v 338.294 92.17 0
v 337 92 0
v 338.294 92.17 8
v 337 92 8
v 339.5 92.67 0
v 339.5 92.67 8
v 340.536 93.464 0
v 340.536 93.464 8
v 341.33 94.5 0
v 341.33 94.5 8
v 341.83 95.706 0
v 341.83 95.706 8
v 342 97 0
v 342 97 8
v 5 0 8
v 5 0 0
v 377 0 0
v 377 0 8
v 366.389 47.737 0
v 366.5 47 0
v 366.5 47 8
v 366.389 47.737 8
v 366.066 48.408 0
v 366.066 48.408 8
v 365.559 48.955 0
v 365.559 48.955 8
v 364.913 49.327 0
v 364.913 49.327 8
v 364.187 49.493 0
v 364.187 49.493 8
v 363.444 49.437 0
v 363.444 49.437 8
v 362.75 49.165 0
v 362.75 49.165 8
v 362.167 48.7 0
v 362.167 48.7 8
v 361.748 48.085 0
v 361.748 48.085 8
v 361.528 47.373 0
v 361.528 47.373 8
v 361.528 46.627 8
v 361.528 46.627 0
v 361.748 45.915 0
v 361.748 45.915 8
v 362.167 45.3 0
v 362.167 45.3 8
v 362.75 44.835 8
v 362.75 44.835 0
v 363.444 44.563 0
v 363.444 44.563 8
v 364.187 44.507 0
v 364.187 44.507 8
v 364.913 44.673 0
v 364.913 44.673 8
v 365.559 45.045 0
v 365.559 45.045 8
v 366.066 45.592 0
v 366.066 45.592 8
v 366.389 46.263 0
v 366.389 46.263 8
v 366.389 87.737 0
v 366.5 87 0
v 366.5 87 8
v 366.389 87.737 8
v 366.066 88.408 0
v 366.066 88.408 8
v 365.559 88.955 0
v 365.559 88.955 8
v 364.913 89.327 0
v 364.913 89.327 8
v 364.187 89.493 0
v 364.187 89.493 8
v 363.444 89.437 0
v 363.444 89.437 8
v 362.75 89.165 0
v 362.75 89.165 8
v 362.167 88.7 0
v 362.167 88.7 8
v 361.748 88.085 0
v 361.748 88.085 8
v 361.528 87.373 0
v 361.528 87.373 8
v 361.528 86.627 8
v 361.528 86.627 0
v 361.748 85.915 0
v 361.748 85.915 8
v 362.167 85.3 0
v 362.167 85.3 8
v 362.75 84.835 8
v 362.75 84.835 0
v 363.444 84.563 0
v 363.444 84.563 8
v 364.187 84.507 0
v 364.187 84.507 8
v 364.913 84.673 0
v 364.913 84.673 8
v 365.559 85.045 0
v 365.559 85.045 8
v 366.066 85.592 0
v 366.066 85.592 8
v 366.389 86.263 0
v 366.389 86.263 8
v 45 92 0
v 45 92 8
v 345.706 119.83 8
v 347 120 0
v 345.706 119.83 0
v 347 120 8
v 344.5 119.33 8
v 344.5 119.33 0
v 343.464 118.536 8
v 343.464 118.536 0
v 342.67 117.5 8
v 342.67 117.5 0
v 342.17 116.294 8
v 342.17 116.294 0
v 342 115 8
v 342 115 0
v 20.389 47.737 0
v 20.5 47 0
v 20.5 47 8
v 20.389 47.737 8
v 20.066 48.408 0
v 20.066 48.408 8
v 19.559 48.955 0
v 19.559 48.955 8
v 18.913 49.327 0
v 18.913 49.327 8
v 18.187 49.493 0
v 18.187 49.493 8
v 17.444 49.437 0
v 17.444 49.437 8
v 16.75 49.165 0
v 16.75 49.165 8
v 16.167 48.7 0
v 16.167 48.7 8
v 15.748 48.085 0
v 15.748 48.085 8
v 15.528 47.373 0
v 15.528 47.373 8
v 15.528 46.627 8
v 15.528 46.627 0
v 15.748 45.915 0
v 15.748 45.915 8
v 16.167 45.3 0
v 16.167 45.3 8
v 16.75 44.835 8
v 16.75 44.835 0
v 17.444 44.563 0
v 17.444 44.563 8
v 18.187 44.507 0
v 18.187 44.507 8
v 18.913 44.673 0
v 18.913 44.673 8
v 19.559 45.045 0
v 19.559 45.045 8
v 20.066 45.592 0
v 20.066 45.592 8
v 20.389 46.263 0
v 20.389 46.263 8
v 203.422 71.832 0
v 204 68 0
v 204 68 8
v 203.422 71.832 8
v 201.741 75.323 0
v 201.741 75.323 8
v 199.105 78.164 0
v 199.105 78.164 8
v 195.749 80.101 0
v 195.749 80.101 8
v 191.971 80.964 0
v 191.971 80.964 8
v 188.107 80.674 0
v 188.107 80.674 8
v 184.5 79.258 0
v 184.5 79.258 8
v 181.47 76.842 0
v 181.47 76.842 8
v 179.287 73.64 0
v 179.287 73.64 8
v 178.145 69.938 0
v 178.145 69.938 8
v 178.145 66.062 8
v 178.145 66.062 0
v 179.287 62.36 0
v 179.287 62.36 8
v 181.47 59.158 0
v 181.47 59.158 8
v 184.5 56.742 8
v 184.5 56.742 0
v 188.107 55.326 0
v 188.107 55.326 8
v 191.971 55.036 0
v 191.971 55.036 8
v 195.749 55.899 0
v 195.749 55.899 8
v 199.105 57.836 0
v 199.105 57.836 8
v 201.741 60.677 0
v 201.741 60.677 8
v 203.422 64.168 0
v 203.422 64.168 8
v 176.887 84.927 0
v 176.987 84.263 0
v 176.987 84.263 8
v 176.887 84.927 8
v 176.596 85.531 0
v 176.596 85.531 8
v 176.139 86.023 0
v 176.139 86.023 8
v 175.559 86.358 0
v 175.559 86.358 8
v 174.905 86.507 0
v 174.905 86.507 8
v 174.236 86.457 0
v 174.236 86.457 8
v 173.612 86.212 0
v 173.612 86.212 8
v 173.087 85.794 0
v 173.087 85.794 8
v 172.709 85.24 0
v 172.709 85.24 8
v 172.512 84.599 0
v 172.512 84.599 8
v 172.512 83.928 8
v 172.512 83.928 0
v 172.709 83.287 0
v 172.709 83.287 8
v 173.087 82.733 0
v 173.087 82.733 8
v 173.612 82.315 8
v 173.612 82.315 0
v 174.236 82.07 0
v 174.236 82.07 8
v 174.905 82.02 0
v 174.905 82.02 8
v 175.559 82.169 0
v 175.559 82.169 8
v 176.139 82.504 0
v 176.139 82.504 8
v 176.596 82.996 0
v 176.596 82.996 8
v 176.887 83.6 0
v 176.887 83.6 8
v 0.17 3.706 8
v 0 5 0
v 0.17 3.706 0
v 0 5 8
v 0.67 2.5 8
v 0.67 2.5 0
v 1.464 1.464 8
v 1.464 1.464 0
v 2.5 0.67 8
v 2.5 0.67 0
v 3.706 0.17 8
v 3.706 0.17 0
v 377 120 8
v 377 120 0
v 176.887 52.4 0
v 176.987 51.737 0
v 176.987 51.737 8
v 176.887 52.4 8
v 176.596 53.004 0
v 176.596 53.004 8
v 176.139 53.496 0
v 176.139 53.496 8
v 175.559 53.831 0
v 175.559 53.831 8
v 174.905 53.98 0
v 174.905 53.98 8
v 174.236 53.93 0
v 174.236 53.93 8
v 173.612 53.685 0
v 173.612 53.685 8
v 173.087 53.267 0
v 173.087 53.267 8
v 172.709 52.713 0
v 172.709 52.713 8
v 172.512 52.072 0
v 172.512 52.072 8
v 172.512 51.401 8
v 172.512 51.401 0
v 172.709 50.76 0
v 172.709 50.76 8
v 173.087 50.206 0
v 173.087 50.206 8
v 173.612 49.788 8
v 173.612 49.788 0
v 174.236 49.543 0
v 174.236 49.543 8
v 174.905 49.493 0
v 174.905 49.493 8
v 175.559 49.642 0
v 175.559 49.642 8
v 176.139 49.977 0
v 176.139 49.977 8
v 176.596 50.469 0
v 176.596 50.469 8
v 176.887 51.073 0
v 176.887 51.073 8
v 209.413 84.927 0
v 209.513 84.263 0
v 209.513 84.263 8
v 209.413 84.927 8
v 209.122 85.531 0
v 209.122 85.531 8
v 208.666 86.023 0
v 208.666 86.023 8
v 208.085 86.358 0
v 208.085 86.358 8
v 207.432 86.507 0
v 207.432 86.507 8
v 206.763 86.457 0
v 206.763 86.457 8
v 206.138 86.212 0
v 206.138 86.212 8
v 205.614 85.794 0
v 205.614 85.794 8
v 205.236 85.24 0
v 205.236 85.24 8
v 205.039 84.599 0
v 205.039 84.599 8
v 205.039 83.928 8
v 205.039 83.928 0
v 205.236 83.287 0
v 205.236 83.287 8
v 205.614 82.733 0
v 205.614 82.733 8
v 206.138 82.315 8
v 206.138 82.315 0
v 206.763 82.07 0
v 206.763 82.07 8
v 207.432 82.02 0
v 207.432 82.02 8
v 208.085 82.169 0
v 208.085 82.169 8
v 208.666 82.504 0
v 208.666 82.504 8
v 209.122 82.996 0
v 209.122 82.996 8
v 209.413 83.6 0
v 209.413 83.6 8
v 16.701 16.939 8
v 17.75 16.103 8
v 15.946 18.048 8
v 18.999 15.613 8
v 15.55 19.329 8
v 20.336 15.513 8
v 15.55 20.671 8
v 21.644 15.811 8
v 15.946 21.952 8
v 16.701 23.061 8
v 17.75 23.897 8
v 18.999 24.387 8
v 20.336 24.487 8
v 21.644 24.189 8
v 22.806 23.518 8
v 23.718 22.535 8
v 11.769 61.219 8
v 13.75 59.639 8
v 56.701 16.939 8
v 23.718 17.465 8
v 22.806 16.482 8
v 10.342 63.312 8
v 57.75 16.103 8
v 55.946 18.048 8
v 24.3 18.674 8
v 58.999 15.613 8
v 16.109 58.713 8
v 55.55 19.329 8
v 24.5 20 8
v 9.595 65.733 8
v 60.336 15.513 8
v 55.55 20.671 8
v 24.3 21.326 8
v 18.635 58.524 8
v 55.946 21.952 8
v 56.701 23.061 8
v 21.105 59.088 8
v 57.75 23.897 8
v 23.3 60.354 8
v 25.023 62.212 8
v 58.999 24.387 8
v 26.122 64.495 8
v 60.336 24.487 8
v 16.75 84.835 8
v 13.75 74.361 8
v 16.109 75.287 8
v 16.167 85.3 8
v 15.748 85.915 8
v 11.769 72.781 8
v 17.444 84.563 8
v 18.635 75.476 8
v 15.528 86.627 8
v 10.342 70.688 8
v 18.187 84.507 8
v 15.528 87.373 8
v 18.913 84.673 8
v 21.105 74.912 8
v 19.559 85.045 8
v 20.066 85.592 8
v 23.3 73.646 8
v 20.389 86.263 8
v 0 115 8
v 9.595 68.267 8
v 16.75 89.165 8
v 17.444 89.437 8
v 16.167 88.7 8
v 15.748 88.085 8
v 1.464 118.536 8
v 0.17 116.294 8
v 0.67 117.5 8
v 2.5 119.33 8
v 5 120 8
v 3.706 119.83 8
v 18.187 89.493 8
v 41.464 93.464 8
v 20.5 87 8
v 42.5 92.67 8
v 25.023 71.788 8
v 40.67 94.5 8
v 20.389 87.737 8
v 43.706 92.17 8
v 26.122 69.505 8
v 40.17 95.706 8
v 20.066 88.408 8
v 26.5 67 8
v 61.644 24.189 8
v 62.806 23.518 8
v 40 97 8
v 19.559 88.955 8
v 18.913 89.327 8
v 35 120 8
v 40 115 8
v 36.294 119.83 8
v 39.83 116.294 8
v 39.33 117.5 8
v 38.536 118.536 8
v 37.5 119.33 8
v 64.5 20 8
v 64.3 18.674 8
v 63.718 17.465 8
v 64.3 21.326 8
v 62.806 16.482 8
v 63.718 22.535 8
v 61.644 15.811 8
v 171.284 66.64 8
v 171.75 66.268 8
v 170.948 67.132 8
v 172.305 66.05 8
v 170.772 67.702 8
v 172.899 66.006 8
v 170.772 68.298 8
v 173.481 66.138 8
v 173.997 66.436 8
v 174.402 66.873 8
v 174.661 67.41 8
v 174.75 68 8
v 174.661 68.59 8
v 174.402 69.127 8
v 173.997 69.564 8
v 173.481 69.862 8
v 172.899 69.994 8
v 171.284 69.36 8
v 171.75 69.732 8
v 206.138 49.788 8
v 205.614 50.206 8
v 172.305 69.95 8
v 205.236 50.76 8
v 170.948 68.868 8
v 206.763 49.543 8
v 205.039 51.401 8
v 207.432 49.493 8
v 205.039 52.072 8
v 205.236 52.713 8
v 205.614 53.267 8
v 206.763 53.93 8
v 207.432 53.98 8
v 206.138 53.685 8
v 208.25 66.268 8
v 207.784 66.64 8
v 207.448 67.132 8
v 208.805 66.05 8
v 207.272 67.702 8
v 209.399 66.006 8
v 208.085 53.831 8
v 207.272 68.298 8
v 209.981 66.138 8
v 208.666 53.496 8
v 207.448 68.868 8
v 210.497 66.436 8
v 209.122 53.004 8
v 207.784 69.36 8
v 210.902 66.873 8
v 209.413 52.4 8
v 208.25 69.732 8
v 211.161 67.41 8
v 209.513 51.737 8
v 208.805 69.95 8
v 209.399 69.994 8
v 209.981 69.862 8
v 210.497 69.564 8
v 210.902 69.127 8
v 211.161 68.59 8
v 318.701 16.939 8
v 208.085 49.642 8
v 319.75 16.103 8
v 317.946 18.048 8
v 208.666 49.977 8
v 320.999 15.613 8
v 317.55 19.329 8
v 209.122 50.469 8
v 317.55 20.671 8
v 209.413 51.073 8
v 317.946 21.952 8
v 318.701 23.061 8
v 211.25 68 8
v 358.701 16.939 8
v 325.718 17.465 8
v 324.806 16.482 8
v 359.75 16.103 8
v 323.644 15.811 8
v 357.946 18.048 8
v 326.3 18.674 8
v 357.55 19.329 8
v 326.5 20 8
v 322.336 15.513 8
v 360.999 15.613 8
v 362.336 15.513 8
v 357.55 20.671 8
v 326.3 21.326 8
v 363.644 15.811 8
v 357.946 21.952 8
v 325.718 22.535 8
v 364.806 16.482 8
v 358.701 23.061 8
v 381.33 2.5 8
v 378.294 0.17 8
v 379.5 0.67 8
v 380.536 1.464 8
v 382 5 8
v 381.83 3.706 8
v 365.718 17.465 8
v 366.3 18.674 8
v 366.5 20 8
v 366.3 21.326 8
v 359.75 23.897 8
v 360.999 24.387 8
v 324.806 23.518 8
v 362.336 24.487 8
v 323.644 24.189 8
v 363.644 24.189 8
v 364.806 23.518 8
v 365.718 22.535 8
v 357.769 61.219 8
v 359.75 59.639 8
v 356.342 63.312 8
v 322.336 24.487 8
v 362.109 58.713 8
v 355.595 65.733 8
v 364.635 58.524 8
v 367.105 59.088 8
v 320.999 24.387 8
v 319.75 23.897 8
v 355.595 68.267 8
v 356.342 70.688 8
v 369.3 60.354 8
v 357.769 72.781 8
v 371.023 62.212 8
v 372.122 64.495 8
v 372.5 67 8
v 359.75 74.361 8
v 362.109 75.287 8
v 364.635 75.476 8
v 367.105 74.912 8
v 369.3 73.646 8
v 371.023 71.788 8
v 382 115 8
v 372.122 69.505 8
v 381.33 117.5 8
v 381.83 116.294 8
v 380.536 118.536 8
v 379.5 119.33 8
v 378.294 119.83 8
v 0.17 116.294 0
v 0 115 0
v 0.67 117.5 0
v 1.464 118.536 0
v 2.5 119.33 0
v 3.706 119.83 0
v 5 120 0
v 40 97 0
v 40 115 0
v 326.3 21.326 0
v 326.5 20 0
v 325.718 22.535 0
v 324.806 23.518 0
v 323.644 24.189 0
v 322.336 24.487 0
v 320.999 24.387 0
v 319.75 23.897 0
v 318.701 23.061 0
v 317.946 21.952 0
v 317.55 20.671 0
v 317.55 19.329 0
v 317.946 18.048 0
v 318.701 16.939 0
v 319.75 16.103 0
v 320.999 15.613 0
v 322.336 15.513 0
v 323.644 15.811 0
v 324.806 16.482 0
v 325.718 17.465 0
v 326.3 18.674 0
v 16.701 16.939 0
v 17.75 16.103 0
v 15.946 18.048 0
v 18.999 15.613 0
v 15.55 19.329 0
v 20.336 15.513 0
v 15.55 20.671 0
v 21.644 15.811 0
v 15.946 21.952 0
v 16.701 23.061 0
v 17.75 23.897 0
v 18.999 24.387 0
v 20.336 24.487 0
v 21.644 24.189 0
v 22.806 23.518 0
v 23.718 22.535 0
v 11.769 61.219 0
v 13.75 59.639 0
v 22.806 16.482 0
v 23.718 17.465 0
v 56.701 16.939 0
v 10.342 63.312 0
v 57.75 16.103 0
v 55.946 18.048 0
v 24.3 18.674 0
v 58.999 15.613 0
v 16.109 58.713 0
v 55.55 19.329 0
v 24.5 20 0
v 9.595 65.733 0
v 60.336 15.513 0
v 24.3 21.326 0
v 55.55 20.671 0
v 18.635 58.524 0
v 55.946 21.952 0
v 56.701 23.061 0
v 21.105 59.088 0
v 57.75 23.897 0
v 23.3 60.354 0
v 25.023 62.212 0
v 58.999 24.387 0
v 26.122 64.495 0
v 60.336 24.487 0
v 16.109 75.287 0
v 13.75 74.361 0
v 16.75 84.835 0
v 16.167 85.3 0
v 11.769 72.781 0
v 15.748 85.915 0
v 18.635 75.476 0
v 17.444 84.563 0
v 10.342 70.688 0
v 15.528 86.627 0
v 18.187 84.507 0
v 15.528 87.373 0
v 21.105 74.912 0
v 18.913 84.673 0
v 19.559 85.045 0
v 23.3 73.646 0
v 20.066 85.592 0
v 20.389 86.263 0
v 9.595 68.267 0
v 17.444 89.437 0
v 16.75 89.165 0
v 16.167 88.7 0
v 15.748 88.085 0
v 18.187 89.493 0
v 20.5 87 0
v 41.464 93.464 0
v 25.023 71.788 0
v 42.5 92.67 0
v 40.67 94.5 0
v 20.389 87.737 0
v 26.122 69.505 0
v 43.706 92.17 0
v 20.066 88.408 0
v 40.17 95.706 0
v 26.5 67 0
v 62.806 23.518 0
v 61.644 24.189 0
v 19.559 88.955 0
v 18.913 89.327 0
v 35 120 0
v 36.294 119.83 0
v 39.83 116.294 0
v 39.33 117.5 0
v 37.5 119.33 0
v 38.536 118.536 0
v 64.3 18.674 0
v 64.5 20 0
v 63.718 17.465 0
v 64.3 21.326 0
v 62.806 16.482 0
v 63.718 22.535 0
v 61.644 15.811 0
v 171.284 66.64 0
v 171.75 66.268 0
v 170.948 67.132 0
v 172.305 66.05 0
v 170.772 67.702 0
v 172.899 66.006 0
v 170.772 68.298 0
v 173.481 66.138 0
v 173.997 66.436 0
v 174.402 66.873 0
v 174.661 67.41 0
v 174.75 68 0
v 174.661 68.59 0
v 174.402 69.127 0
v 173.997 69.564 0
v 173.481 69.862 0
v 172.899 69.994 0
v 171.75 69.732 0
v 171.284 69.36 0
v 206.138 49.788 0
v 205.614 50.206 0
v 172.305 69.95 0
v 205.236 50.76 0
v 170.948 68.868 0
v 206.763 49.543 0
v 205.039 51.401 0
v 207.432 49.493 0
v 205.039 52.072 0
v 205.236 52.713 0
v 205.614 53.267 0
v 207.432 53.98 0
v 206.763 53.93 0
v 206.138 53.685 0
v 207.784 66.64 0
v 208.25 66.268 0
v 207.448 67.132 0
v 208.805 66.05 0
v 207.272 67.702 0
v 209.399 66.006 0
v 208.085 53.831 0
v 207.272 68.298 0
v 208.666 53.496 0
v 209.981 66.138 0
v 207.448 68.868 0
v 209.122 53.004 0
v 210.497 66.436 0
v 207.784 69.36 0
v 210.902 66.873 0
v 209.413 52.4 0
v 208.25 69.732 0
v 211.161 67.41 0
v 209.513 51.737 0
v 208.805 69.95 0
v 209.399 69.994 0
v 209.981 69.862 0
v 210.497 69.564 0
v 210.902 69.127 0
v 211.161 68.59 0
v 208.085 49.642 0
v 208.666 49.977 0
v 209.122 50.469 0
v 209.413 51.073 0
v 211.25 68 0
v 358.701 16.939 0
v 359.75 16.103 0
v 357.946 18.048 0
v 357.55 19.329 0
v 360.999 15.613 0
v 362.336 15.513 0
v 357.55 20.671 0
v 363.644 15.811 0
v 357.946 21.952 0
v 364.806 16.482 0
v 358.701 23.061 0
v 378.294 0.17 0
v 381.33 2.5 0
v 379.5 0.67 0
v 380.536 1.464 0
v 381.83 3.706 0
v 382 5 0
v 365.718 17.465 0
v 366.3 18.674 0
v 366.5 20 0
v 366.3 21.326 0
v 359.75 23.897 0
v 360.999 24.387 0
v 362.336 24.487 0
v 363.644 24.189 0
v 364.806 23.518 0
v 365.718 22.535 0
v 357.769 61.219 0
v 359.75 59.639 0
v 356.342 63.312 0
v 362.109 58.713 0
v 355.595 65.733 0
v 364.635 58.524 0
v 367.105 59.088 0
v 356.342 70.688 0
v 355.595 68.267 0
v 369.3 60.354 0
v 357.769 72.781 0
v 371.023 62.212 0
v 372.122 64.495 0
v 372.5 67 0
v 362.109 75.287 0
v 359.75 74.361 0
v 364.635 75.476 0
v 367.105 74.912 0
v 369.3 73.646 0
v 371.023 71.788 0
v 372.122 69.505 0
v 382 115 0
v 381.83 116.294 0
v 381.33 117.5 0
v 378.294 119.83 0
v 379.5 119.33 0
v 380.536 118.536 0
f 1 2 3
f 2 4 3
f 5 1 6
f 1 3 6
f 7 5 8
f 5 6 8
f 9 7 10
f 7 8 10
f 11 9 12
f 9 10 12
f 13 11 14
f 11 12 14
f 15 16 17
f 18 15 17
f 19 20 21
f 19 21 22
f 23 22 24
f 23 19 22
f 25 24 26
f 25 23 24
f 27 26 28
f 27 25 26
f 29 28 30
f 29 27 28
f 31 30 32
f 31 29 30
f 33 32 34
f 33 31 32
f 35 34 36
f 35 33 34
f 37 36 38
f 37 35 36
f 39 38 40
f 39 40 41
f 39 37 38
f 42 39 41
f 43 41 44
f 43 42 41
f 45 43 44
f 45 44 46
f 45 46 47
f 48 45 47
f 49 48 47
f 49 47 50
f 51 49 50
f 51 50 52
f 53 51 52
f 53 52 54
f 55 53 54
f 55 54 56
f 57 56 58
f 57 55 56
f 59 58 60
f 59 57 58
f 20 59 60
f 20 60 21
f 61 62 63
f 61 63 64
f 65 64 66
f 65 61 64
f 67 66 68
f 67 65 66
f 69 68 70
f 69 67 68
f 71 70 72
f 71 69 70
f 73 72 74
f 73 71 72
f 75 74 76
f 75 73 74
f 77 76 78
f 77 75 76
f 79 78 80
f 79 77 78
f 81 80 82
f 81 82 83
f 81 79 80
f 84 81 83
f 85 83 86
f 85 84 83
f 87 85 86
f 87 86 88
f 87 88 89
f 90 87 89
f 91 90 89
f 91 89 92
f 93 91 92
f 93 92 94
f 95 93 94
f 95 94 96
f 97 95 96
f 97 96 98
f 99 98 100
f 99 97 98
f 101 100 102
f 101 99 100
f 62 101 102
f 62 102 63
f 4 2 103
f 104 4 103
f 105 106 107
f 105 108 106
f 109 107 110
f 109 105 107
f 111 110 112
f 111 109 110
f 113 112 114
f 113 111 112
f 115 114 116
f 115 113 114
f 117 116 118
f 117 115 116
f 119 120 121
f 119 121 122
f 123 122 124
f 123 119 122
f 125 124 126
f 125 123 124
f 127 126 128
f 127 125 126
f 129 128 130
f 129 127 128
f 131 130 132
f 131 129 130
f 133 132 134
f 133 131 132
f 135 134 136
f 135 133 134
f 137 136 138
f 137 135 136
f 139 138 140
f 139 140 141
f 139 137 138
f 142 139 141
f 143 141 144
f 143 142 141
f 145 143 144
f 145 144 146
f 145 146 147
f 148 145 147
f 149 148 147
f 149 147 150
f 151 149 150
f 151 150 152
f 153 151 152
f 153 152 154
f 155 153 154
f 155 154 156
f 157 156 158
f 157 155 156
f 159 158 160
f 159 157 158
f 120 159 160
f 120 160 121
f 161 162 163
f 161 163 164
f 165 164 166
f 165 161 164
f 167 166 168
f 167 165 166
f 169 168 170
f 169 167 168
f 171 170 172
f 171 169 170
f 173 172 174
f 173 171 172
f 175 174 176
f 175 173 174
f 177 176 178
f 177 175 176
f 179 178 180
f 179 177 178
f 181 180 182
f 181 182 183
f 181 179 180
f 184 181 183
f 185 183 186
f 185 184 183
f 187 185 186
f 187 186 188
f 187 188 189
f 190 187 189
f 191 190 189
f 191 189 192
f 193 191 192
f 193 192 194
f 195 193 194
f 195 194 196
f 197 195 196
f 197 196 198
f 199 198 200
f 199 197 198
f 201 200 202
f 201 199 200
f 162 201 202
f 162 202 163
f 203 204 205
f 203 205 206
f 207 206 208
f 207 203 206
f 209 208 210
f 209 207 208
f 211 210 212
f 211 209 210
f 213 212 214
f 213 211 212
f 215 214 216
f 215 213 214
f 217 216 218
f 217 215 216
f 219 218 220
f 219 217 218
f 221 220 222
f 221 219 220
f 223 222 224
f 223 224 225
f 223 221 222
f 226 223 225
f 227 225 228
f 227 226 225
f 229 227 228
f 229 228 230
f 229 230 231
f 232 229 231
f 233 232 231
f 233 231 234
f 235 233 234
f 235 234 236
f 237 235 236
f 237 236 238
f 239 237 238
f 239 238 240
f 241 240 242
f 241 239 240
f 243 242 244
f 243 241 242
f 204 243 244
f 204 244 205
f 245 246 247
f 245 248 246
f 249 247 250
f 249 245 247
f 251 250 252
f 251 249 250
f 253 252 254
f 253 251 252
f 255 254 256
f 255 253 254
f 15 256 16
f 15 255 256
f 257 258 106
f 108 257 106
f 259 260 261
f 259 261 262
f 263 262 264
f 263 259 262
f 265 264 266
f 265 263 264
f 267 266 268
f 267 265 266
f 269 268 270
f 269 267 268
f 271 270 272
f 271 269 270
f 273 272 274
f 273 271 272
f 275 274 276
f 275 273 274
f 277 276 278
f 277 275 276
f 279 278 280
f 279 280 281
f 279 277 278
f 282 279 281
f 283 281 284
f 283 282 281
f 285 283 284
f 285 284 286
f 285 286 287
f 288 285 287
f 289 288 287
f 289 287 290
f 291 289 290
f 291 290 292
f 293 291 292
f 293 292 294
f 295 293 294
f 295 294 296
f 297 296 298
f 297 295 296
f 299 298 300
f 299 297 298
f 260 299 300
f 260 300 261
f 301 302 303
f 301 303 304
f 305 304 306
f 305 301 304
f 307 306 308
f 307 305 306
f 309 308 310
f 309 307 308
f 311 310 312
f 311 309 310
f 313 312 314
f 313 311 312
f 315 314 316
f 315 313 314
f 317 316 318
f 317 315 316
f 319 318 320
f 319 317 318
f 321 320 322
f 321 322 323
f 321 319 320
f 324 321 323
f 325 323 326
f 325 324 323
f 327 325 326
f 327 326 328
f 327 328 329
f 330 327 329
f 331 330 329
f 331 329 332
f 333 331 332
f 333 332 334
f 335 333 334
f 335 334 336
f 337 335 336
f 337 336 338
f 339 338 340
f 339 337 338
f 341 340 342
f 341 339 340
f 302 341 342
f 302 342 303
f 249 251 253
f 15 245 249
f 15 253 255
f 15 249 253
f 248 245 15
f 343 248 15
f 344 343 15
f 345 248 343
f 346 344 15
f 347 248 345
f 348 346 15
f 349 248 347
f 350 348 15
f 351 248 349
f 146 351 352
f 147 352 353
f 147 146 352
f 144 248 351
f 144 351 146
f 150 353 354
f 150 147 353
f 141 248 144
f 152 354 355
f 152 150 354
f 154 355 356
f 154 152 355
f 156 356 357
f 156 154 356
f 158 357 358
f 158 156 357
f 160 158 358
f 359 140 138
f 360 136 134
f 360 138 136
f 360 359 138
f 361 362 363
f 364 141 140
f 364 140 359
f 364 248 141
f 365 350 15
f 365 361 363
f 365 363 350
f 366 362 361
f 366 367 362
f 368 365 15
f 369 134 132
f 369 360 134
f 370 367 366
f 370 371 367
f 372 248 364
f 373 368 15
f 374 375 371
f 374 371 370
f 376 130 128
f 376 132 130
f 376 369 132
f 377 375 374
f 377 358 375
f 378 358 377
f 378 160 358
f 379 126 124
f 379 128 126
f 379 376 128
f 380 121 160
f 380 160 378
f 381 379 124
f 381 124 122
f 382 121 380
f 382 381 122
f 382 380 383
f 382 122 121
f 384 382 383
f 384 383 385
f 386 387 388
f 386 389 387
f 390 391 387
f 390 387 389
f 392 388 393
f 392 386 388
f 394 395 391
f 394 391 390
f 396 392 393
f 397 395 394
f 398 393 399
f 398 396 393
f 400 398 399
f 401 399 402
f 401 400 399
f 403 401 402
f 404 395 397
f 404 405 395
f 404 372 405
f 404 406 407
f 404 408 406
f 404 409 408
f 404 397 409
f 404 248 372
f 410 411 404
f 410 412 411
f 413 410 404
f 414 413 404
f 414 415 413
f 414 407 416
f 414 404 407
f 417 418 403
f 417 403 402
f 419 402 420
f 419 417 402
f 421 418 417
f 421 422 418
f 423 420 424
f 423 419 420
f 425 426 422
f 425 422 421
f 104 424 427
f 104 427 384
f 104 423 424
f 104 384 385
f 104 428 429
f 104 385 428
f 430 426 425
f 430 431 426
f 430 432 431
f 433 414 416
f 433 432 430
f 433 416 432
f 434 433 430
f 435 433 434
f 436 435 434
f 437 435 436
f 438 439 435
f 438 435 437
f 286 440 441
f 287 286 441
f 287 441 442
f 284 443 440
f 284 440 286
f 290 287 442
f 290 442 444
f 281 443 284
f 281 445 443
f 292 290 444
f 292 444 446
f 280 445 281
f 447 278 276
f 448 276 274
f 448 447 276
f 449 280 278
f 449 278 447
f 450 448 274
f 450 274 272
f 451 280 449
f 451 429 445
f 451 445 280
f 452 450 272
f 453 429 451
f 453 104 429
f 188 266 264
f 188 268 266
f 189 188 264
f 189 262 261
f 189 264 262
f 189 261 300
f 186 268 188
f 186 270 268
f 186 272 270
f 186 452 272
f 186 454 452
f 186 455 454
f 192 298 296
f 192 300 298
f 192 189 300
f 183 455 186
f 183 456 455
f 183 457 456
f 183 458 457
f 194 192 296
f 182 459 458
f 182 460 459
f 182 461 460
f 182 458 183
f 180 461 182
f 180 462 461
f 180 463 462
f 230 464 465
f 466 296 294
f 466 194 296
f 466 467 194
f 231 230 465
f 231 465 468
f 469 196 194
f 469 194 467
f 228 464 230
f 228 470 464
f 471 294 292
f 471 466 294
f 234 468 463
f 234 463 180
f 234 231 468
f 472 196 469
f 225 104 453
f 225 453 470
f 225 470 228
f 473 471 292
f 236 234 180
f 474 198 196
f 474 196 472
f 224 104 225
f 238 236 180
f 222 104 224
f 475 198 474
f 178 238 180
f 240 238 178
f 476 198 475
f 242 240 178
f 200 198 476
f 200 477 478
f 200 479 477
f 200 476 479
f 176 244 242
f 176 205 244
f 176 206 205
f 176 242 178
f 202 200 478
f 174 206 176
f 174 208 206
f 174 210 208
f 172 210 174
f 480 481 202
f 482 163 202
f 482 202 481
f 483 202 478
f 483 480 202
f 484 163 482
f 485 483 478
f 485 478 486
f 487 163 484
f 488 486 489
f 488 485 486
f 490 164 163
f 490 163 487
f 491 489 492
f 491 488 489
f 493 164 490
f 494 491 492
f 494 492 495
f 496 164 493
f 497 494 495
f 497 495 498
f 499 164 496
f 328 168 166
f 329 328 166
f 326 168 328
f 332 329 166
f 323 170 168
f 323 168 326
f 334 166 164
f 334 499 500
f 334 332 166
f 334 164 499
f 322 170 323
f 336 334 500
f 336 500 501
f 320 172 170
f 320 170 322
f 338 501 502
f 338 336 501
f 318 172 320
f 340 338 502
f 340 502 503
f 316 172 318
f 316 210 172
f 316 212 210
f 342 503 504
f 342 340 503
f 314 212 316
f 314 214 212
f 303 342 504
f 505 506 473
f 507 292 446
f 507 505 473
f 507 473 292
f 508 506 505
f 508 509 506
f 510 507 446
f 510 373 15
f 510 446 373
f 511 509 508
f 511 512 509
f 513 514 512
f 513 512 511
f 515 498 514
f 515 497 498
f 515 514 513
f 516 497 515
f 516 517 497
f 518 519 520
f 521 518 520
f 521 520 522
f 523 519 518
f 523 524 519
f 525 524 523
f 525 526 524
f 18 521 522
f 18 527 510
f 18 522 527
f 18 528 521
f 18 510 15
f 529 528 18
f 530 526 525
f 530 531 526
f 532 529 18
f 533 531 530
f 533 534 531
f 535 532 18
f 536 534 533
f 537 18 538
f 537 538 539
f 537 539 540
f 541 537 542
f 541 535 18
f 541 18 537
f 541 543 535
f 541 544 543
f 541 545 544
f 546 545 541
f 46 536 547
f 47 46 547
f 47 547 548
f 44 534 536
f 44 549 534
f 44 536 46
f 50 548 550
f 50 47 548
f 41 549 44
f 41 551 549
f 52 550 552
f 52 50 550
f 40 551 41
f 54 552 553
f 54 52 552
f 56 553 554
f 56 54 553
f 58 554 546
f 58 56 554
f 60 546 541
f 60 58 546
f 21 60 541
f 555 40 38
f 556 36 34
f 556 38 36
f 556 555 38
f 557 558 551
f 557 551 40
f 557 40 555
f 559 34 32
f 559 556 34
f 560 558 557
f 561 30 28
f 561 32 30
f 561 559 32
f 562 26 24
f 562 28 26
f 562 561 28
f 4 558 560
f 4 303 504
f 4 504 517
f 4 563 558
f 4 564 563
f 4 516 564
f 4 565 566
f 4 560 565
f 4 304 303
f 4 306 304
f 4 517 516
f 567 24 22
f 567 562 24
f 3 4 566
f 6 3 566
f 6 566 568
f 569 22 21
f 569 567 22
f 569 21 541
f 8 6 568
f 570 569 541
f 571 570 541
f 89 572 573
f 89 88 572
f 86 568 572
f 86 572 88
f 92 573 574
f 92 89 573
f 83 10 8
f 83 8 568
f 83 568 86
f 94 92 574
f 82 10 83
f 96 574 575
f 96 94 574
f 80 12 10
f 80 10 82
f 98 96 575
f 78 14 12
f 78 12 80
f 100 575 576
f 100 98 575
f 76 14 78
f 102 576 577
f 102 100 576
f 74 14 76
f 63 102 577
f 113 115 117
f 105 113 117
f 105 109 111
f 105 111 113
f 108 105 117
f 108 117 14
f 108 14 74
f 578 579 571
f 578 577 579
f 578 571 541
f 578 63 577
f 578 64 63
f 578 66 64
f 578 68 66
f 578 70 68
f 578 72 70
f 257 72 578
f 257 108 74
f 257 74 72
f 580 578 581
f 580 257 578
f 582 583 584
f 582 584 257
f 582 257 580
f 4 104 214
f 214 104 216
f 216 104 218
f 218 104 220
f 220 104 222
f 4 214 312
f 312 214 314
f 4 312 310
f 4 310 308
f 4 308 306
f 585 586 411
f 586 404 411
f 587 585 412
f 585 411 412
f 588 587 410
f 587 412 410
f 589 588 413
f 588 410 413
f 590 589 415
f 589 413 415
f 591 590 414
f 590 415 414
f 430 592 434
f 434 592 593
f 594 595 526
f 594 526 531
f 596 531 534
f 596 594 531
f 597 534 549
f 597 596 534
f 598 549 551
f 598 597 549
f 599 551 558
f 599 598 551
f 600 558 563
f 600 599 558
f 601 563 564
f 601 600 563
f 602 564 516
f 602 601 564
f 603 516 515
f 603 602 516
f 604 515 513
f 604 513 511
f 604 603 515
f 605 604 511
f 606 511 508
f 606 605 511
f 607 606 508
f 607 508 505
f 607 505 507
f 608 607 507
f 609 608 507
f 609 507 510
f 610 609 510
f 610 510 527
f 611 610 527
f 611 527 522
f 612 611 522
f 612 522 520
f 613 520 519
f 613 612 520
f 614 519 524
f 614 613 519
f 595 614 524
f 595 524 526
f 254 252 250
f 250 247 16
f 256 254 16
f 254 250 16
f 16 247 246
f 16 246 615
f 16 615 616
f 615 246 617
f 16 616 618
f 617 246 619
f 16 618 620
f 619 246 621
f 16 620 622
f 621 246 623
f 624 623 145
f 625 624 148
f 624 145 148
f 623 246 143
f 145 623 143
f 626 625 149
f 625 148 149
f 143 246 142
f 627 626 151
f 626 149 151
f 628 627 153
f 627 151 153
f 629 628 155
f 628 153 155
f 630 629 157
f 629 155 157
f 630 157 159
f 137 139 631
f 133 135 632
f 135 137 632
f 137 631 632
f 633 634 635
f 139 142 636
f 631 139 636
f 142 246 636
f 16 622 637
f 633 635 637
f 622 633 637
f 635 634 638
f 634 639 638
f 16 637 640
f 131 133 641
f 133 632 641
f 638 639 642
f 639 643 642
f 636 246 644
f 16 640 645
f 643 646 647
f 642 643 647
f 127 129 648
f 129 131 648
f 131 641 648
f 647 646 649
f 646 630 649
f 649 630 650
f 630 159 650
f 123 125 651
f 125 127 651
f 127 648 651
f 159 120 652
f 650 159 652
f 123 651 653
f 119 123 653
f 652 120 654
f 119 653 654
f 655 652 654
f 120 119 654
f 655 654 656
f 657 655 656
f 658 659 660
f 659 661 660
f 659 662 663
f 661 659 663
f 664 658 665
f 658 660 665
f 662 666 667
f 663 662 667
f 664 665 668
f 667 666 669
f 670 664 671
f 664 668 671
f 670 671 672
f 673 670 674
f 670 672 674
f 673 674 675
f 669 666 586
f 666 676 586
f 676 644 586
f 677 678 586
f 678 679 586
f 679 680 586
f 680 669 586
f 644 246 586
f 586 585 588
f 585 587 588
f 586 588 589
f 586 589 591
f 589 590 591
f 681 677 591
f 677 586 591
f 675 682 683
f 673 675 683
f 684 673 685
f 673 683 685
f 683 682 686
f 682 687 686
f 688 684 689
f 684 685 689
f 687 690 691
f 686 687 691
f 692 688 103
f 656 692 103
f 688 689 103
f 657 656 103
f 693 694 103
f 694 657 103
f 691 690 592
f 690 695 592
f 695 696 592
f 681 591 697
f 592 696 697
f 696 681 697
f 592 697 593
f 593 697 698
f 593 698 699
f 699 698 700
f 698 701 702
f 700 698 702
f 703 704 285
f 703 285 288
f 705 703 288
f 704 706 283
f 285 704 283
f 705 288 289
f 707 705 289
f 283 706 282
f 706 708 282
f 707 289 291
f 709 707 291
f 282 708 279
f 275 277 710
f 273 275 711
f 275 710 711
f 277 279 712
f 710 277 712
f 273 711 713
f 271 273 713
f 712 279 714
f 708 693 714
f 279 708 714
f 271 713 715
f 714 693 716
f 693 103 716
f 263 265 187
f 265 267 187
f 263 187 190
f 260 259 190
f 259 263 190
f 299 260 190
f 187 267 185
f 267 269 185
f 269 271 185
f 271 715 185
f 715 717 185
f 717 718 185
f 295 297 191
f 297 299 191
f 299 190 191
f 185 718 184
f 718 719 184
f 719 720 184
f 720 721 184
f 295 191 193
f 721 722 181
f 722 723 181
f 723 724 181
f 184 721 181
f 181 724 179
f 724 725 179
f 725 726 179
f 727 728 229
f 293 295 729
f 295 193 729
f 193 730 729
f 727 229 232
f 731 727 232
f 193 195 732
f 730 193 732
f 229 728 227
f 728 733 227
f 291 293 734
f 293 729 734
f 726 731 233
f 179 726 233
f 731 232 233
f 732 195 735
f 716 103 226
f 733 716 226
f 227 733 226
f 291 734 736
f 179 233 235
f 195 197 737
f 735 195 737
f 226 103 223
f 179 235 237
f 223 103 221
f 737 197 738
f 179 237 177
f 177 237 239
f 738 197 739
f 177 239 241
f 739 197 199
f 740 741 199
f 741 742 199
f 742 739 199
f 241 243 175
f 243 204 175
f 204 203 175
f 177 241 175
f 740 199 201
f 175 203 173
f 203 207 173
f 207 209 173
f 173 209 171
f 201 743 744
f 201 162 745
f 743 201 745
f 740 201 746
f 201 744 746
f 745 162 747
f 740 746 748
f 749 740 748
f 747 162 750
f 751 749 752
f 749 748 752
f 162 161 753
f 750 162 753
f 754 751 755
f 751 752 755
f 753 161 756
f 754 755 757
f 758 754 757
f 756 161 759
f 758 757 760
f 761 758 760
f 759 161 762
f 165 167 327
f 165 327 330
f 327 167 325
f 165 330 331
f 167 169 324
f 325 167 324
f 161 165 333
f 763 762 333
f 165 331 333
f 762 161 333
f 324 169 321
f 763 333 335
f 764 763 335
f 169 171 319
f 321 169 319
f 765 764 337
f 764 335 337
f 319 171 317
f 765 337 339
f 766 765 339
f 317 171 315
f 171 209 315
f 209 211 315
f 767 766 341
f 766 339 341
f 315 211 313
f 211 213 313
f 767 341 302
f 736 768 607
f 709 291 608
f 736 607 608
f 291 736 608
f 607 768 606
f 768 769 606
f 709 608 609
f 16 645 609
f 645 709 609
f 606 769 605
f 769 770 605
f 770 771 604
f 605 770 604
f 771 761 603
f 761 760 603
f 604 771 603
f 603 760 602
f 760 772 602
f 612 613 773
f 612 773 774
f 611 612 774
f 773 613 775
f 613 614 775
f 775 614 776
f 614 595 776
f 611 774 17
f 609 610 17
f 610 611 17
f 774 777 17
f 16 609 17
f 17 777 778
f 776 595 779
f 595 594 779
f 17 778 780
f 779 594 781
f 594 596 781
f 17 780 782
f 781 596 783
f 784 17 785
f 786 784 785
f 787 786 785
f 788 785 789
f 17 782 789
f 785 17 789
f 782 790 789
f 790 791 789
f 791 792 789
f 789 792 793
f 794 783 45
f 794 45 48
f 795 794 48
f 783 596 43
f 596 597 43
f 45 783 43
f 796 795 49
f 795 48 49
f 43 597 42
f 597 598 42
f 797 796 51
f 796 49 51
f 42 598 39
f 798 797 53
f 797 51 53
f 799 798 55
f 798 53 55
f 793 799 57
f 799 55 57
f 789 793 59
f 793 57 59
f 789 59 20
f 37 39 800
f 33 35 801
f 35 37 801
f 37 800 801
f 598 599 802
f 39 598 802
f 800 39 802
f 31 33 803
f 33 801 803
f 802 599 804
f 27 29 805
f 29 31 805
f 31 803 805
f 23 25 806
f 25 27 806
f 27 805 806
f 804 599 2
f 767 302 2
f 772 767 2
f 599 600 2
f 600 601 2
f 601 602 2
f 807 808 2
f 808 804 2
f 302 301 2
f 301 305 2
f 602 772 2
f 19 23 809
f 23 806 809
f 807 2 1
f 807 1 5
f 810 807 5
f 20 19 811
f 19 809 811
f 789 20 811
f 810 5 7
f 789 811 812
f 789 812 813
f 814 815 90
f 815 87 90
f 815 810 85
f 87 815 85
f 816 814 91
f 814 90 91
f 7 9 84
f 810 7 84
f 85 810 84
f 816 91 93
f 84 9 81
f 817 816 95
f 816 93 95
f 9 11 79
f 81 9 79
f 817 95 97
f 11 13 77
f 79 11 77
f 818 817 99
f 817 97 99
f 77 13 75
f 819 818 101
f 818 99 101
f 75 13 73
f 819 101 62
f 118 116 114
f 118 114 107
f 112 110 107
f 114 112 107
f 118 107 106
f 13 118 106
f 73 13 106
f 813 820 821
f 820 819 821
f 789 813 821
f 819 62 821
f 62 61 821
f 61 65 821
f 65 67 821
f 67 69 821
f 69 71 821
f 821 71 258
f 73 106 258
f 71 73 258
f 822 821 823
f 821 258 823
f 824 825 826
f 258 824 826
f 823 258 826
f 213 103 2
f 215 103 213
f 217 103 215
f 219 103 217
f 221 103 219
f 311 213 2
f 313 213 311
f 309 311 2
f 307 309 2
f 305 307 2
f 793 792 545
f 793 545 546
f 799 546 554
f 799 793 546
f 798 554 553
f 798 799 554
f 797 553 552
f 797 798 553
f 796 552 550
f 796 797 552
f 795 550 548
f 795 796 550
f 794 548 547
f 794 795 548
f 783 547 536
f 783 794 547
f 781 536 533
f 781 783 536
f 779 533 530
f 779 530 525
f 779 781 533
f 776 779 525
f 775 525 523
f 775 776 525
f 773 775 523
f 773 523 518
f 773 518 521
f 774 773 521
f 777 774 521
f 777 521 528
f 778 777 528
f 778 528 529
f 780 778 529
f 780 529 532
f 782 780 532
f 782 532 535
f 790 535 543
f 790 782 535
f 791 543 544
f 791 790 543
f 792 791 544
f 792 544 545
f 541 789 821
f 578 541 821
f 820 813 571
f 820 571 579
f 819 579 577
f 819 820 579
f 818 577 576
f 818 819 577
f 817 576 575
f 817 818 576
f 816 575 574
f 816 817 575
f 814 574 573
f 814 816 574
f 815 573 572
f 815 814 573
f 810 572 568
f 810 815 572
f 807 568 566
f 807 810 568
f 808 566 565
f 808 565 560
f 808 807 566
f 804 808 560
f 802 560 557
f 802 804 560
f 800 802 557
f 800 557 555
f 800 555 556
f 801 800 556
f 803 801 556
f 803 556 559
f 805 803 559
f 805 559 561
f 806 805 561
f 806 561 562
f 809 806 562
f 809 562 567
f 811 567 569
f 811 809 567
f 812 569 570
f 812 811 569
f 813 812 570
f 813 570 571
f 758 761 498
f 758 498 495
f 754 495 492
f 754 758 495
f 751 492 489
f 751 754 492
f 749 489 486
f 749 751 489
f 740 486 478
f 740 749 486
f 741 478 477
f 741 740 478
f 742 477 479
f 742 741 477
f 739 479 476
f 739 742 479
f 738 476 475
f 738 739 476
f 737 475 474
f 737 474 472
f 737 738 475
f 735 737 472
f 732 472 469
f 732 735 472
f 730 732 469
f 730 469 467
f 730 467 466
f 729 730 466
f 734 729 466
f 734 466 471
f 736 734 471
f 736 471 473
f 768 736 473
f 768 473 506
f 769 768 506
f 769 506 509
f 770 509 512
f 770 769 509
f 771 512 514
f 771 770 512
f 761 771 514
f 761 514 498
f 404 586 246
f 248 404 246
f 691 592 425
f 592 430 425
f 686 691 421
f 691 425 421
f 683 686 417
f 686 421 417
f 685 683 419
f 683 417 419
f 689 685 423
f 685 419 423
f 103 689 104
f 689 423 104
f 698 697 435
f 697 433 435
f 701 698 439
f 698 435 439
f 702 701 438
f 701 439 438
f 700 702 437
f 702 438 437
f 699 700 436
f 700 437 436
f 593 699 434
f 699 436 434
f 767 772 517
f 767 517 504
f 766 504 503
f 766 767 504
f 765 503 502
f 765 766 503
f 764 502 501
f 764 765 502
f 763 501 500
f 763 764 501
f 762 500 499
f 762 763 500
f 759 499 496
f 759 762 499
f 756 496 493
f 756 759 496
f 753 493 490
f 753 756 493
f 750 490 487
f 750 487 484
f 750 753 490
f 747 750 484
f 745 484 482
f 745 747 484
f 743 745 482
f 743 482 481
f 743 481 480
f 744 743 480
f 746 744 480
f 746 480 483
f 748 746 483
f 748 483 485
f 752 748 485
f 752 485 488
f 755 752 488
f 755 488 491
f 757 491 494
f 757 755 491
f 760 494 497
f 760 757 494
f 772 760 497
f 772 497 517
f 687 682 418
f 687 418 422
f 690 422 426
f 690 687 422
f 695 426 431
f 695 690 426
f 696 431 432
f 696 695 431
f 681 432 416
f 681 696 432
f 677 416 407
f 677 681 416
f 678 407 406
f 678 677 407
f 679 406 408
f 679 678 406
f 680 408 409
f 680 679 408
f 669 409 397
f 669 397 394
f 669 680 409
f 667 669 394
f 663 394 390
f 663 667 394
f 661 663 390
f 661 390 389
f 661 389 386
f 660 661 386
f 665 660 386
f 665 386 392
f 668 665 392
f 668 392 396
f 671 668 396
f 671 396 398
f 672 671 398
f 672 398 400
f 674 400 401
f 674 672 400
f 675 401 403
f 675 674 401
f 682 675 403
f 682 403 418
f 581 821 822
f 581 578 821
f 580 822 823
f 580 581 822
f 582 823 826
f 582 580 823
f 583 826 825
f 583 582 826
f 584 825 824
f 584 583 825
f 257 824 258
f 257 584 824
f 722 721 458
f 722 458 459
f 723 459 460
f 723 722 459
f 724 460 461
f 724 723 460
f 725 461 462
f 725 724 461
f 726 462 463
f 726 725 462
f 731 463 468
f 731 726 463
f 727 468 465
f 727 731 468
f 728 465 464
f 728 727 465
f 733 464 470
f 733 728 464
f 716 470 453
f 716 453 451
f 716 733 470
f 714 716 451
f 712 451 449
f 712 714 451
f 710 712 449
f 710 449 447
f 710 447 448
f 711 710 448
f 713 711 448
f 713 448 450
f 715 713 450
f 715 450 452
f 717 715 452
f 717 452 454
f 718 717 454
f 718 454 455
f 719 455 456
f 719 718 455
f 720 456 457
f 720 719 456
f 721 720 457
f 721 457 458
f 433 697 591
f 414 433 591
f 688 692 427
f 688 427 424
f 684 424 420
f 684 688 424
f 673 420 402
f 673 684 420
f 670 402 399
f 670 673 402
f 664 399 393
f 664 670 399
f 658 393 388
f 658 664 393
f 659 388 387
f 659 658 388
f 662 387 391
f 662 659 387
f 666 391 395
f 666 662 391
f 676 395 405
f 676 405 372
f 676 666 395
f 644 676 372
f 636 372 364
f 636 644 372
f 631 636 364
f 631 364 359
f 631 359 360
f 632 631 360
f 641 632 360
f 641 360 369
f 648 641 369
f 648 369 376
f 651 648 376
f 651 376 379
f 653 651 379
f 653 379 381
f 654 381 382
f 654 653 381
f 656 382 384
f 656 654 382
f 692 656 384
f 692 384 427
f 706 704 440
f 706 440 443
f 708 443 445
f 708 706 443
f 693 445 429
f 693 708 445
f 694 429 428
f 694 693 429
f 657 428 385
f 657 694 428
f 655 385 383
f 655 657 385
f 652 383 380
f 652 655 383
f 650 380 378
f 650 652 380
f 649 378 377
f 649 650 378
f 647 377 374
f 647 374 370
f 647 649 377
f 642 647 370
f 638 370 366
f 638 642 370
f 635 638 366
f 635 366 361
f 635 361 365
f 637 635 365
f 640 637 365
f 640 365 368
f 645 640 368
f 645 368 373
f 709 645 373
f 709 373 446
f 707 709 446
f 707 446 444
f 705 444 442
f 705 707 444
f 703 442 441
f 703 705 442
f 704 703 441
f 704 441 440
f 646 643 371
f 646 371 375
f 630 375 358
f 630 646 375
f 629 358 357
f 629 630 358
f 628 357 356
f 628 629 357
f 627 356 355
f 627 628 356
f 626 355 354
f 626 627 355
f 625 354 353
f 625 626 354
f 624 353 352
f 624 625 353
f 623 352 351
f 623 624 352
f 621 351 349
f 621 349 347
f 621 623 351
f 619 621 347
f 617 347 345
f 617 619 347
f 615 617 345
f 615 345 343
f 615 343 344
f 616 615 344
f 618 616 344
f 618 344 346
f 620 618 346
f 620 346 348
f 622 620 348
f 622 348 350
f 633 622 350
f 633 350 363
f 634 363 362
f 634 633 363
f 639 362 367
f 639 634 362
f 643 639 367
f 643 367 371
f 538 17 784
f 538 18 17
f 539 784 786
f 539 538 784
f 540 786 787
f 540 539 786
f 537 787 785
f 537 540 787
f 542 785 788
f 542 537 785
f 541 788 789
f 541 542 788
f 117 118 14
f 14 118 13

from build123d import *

# Parameters (mm, degrees)
F0_R     = 4.5
F0_R_2   = 2.5
F0_R_3   = 2.25
F0_R_4   = 8.5
F0_R_5   = 2
F0_R_6   = 13
F1_DEPTH = 8
F2_DEPTH = 25
F3_R     = 5


with BuildPart() as f1:
    # F0 (on Top) → F1 (new body)
    with BuildSketch(Plane.XY):
        Polygon((0, 120), (0, 0), (382, 0), (382, 120), (342, 120), (342, 92), (40, 92), (40, 120), align=None)
        with Locations((20, 20)):
            Circle(F0_R, mode=Mode.SUBTRACT)
        with Locations((60, 20)):
            Circle(F0_R, mode=Mode.SUBTRACT)
        with Locations((18, 47)):
            Circle(F0_R_2, mode=Mode.SUBTRACT)
        with Locations((174.736544, 51.736544)):
            Circle(F0_R_3, mode=Mode.SUBTRACT)
        with Locations((322, 20)):
            Circle(F0_R, mode=Mode.SUBTRACT)
        with Locations((362, 20)):
            Circle(F0_R, mode=Mode.SUBTRACT)
        with Locations((207.263456, 51.736544)):
            Circle(F0_R_3, mode=Mode.SUBTRACT)
        with Locations((364, 47)):
            Circle(F0_R_2, mode=Mode.SUBTRACT)
        with Locations((18, 67)):
            Circle(F0_R_4, mode=Mode.SUBTRACT)
        with Locations((18, 87)):
            Circle(F0_R_2, mode=Mode.SUBTRACT)
        with Locations((172.75, 68)):
            Circle(F0_R_5, mode=Mode.SUBTRACT)
        with Locations((174.736544, 84.263456)):
            Circle(F0_R_3, mode=Mode.SUBTRACT)
        with Locations((191, 68)):
            Circle(F0_R_6, mode=Mode.SUBTRACT)
        with Locations((209.25, 68)):
            Circle(F0_R_5, mode=Mode.SUBTRACT)
        with Locations((207.263456, 84.263456)):
            Circle(F0_R_3, mode=Mode.SUBTRACT)
        with Locations((364, 67)):
            Circle(F0_R_4, mode=Mode.SUBTRACT)
        with Locations((364, 87)):
            Circle(F0_R_2, mode=Mode.SUBTRACT)
    extrude(amount=F1_DEPTH)

    # F0 (on Top) → F2 (cut)
    with BuildSketch(Plane.XY):
        Polygon((0, 120), (0, 0), (382, 0), (382, 120), (342, 120), (342, 92), (40, 92), (40, 120), align=None)
        with Locations((20, 20)):
            Circle(F0_R, mode=Mode.SUBTRACT)
        with Locations((60, 20)):
            Circle(F0_R, mode=Mode.SUBTRACT)
        with Locations((18, 47)):
            Circle(F0_R_2, mode=Mode.SUBTRACT)
        with Locations((174.736544, 51.736544)):
            Circle(F0_R_3, mode=Mode.SUBTRACT)
        with Locations((322, 20)):
            Circle(F0_R, mode=Mode.SUBTRACT)
        with Locations((362, 20)):
            Circle(F0_R, mode=Mode.SUBTRACT)
        with Locations((207.263456, 51.736544)):
            Circle(F0_R_3, mode=Mode.SUBTRACT)
        with Locations((364, 47)):
            Circle(F0_R_2, mode=Mode.SUBTRACT)
        with Locations((18, 67)):
            Circle(F0_R_4, mode=Mode.SUBTRACT)
        with Locations((18, 87)):
            Circle(F0_R_2, mode=Mode.SUBTRACT)
        with Locations((172.75, 68)):
            Circle(F0_R_5, mode=Mode.SUBTRACT)
        with Locations((174.736544, 84.263456)):
            Circle(F0_R_3, mode=Mode.SUBTRACT)
        with Locations((191, 68)):
            Circle(F0_R_6, mode=Mode.SUBTRACT)
        with Locations((209.25, 68)):
            Circle(F0_R_5, mode=Mode.SUBTRACT)
        with Locations((207.263456, 84.263456)):
            Circle(F0_R_3, mode=Mode.SUBTRACT)
        with Locations((364, 67)):
            Circle(F0_R_4, mode=Mode.SUBTRACT)
        with Locations((364, 87)):
            Circle(F0_R_2, mode=Mode.SUBTRACT)
    extrude(amount=-F2_DEPTH, mode=Mode.SUBTRACT)

    # F3
    f3_edges = [f1.edges().sort_by_distance(p)[0] for p in [
        (382, 0, 4),
        (382, 120, 4),
        (342, 120, 4),
        (342, 92, 4),
        (40, 92, 4),
        (40, 120, 4),
        (0, 120, 4),
        (0, 0, 4),
    ]]
    fillet(f3_edges, radius=F3_R)


solid = f1.part
